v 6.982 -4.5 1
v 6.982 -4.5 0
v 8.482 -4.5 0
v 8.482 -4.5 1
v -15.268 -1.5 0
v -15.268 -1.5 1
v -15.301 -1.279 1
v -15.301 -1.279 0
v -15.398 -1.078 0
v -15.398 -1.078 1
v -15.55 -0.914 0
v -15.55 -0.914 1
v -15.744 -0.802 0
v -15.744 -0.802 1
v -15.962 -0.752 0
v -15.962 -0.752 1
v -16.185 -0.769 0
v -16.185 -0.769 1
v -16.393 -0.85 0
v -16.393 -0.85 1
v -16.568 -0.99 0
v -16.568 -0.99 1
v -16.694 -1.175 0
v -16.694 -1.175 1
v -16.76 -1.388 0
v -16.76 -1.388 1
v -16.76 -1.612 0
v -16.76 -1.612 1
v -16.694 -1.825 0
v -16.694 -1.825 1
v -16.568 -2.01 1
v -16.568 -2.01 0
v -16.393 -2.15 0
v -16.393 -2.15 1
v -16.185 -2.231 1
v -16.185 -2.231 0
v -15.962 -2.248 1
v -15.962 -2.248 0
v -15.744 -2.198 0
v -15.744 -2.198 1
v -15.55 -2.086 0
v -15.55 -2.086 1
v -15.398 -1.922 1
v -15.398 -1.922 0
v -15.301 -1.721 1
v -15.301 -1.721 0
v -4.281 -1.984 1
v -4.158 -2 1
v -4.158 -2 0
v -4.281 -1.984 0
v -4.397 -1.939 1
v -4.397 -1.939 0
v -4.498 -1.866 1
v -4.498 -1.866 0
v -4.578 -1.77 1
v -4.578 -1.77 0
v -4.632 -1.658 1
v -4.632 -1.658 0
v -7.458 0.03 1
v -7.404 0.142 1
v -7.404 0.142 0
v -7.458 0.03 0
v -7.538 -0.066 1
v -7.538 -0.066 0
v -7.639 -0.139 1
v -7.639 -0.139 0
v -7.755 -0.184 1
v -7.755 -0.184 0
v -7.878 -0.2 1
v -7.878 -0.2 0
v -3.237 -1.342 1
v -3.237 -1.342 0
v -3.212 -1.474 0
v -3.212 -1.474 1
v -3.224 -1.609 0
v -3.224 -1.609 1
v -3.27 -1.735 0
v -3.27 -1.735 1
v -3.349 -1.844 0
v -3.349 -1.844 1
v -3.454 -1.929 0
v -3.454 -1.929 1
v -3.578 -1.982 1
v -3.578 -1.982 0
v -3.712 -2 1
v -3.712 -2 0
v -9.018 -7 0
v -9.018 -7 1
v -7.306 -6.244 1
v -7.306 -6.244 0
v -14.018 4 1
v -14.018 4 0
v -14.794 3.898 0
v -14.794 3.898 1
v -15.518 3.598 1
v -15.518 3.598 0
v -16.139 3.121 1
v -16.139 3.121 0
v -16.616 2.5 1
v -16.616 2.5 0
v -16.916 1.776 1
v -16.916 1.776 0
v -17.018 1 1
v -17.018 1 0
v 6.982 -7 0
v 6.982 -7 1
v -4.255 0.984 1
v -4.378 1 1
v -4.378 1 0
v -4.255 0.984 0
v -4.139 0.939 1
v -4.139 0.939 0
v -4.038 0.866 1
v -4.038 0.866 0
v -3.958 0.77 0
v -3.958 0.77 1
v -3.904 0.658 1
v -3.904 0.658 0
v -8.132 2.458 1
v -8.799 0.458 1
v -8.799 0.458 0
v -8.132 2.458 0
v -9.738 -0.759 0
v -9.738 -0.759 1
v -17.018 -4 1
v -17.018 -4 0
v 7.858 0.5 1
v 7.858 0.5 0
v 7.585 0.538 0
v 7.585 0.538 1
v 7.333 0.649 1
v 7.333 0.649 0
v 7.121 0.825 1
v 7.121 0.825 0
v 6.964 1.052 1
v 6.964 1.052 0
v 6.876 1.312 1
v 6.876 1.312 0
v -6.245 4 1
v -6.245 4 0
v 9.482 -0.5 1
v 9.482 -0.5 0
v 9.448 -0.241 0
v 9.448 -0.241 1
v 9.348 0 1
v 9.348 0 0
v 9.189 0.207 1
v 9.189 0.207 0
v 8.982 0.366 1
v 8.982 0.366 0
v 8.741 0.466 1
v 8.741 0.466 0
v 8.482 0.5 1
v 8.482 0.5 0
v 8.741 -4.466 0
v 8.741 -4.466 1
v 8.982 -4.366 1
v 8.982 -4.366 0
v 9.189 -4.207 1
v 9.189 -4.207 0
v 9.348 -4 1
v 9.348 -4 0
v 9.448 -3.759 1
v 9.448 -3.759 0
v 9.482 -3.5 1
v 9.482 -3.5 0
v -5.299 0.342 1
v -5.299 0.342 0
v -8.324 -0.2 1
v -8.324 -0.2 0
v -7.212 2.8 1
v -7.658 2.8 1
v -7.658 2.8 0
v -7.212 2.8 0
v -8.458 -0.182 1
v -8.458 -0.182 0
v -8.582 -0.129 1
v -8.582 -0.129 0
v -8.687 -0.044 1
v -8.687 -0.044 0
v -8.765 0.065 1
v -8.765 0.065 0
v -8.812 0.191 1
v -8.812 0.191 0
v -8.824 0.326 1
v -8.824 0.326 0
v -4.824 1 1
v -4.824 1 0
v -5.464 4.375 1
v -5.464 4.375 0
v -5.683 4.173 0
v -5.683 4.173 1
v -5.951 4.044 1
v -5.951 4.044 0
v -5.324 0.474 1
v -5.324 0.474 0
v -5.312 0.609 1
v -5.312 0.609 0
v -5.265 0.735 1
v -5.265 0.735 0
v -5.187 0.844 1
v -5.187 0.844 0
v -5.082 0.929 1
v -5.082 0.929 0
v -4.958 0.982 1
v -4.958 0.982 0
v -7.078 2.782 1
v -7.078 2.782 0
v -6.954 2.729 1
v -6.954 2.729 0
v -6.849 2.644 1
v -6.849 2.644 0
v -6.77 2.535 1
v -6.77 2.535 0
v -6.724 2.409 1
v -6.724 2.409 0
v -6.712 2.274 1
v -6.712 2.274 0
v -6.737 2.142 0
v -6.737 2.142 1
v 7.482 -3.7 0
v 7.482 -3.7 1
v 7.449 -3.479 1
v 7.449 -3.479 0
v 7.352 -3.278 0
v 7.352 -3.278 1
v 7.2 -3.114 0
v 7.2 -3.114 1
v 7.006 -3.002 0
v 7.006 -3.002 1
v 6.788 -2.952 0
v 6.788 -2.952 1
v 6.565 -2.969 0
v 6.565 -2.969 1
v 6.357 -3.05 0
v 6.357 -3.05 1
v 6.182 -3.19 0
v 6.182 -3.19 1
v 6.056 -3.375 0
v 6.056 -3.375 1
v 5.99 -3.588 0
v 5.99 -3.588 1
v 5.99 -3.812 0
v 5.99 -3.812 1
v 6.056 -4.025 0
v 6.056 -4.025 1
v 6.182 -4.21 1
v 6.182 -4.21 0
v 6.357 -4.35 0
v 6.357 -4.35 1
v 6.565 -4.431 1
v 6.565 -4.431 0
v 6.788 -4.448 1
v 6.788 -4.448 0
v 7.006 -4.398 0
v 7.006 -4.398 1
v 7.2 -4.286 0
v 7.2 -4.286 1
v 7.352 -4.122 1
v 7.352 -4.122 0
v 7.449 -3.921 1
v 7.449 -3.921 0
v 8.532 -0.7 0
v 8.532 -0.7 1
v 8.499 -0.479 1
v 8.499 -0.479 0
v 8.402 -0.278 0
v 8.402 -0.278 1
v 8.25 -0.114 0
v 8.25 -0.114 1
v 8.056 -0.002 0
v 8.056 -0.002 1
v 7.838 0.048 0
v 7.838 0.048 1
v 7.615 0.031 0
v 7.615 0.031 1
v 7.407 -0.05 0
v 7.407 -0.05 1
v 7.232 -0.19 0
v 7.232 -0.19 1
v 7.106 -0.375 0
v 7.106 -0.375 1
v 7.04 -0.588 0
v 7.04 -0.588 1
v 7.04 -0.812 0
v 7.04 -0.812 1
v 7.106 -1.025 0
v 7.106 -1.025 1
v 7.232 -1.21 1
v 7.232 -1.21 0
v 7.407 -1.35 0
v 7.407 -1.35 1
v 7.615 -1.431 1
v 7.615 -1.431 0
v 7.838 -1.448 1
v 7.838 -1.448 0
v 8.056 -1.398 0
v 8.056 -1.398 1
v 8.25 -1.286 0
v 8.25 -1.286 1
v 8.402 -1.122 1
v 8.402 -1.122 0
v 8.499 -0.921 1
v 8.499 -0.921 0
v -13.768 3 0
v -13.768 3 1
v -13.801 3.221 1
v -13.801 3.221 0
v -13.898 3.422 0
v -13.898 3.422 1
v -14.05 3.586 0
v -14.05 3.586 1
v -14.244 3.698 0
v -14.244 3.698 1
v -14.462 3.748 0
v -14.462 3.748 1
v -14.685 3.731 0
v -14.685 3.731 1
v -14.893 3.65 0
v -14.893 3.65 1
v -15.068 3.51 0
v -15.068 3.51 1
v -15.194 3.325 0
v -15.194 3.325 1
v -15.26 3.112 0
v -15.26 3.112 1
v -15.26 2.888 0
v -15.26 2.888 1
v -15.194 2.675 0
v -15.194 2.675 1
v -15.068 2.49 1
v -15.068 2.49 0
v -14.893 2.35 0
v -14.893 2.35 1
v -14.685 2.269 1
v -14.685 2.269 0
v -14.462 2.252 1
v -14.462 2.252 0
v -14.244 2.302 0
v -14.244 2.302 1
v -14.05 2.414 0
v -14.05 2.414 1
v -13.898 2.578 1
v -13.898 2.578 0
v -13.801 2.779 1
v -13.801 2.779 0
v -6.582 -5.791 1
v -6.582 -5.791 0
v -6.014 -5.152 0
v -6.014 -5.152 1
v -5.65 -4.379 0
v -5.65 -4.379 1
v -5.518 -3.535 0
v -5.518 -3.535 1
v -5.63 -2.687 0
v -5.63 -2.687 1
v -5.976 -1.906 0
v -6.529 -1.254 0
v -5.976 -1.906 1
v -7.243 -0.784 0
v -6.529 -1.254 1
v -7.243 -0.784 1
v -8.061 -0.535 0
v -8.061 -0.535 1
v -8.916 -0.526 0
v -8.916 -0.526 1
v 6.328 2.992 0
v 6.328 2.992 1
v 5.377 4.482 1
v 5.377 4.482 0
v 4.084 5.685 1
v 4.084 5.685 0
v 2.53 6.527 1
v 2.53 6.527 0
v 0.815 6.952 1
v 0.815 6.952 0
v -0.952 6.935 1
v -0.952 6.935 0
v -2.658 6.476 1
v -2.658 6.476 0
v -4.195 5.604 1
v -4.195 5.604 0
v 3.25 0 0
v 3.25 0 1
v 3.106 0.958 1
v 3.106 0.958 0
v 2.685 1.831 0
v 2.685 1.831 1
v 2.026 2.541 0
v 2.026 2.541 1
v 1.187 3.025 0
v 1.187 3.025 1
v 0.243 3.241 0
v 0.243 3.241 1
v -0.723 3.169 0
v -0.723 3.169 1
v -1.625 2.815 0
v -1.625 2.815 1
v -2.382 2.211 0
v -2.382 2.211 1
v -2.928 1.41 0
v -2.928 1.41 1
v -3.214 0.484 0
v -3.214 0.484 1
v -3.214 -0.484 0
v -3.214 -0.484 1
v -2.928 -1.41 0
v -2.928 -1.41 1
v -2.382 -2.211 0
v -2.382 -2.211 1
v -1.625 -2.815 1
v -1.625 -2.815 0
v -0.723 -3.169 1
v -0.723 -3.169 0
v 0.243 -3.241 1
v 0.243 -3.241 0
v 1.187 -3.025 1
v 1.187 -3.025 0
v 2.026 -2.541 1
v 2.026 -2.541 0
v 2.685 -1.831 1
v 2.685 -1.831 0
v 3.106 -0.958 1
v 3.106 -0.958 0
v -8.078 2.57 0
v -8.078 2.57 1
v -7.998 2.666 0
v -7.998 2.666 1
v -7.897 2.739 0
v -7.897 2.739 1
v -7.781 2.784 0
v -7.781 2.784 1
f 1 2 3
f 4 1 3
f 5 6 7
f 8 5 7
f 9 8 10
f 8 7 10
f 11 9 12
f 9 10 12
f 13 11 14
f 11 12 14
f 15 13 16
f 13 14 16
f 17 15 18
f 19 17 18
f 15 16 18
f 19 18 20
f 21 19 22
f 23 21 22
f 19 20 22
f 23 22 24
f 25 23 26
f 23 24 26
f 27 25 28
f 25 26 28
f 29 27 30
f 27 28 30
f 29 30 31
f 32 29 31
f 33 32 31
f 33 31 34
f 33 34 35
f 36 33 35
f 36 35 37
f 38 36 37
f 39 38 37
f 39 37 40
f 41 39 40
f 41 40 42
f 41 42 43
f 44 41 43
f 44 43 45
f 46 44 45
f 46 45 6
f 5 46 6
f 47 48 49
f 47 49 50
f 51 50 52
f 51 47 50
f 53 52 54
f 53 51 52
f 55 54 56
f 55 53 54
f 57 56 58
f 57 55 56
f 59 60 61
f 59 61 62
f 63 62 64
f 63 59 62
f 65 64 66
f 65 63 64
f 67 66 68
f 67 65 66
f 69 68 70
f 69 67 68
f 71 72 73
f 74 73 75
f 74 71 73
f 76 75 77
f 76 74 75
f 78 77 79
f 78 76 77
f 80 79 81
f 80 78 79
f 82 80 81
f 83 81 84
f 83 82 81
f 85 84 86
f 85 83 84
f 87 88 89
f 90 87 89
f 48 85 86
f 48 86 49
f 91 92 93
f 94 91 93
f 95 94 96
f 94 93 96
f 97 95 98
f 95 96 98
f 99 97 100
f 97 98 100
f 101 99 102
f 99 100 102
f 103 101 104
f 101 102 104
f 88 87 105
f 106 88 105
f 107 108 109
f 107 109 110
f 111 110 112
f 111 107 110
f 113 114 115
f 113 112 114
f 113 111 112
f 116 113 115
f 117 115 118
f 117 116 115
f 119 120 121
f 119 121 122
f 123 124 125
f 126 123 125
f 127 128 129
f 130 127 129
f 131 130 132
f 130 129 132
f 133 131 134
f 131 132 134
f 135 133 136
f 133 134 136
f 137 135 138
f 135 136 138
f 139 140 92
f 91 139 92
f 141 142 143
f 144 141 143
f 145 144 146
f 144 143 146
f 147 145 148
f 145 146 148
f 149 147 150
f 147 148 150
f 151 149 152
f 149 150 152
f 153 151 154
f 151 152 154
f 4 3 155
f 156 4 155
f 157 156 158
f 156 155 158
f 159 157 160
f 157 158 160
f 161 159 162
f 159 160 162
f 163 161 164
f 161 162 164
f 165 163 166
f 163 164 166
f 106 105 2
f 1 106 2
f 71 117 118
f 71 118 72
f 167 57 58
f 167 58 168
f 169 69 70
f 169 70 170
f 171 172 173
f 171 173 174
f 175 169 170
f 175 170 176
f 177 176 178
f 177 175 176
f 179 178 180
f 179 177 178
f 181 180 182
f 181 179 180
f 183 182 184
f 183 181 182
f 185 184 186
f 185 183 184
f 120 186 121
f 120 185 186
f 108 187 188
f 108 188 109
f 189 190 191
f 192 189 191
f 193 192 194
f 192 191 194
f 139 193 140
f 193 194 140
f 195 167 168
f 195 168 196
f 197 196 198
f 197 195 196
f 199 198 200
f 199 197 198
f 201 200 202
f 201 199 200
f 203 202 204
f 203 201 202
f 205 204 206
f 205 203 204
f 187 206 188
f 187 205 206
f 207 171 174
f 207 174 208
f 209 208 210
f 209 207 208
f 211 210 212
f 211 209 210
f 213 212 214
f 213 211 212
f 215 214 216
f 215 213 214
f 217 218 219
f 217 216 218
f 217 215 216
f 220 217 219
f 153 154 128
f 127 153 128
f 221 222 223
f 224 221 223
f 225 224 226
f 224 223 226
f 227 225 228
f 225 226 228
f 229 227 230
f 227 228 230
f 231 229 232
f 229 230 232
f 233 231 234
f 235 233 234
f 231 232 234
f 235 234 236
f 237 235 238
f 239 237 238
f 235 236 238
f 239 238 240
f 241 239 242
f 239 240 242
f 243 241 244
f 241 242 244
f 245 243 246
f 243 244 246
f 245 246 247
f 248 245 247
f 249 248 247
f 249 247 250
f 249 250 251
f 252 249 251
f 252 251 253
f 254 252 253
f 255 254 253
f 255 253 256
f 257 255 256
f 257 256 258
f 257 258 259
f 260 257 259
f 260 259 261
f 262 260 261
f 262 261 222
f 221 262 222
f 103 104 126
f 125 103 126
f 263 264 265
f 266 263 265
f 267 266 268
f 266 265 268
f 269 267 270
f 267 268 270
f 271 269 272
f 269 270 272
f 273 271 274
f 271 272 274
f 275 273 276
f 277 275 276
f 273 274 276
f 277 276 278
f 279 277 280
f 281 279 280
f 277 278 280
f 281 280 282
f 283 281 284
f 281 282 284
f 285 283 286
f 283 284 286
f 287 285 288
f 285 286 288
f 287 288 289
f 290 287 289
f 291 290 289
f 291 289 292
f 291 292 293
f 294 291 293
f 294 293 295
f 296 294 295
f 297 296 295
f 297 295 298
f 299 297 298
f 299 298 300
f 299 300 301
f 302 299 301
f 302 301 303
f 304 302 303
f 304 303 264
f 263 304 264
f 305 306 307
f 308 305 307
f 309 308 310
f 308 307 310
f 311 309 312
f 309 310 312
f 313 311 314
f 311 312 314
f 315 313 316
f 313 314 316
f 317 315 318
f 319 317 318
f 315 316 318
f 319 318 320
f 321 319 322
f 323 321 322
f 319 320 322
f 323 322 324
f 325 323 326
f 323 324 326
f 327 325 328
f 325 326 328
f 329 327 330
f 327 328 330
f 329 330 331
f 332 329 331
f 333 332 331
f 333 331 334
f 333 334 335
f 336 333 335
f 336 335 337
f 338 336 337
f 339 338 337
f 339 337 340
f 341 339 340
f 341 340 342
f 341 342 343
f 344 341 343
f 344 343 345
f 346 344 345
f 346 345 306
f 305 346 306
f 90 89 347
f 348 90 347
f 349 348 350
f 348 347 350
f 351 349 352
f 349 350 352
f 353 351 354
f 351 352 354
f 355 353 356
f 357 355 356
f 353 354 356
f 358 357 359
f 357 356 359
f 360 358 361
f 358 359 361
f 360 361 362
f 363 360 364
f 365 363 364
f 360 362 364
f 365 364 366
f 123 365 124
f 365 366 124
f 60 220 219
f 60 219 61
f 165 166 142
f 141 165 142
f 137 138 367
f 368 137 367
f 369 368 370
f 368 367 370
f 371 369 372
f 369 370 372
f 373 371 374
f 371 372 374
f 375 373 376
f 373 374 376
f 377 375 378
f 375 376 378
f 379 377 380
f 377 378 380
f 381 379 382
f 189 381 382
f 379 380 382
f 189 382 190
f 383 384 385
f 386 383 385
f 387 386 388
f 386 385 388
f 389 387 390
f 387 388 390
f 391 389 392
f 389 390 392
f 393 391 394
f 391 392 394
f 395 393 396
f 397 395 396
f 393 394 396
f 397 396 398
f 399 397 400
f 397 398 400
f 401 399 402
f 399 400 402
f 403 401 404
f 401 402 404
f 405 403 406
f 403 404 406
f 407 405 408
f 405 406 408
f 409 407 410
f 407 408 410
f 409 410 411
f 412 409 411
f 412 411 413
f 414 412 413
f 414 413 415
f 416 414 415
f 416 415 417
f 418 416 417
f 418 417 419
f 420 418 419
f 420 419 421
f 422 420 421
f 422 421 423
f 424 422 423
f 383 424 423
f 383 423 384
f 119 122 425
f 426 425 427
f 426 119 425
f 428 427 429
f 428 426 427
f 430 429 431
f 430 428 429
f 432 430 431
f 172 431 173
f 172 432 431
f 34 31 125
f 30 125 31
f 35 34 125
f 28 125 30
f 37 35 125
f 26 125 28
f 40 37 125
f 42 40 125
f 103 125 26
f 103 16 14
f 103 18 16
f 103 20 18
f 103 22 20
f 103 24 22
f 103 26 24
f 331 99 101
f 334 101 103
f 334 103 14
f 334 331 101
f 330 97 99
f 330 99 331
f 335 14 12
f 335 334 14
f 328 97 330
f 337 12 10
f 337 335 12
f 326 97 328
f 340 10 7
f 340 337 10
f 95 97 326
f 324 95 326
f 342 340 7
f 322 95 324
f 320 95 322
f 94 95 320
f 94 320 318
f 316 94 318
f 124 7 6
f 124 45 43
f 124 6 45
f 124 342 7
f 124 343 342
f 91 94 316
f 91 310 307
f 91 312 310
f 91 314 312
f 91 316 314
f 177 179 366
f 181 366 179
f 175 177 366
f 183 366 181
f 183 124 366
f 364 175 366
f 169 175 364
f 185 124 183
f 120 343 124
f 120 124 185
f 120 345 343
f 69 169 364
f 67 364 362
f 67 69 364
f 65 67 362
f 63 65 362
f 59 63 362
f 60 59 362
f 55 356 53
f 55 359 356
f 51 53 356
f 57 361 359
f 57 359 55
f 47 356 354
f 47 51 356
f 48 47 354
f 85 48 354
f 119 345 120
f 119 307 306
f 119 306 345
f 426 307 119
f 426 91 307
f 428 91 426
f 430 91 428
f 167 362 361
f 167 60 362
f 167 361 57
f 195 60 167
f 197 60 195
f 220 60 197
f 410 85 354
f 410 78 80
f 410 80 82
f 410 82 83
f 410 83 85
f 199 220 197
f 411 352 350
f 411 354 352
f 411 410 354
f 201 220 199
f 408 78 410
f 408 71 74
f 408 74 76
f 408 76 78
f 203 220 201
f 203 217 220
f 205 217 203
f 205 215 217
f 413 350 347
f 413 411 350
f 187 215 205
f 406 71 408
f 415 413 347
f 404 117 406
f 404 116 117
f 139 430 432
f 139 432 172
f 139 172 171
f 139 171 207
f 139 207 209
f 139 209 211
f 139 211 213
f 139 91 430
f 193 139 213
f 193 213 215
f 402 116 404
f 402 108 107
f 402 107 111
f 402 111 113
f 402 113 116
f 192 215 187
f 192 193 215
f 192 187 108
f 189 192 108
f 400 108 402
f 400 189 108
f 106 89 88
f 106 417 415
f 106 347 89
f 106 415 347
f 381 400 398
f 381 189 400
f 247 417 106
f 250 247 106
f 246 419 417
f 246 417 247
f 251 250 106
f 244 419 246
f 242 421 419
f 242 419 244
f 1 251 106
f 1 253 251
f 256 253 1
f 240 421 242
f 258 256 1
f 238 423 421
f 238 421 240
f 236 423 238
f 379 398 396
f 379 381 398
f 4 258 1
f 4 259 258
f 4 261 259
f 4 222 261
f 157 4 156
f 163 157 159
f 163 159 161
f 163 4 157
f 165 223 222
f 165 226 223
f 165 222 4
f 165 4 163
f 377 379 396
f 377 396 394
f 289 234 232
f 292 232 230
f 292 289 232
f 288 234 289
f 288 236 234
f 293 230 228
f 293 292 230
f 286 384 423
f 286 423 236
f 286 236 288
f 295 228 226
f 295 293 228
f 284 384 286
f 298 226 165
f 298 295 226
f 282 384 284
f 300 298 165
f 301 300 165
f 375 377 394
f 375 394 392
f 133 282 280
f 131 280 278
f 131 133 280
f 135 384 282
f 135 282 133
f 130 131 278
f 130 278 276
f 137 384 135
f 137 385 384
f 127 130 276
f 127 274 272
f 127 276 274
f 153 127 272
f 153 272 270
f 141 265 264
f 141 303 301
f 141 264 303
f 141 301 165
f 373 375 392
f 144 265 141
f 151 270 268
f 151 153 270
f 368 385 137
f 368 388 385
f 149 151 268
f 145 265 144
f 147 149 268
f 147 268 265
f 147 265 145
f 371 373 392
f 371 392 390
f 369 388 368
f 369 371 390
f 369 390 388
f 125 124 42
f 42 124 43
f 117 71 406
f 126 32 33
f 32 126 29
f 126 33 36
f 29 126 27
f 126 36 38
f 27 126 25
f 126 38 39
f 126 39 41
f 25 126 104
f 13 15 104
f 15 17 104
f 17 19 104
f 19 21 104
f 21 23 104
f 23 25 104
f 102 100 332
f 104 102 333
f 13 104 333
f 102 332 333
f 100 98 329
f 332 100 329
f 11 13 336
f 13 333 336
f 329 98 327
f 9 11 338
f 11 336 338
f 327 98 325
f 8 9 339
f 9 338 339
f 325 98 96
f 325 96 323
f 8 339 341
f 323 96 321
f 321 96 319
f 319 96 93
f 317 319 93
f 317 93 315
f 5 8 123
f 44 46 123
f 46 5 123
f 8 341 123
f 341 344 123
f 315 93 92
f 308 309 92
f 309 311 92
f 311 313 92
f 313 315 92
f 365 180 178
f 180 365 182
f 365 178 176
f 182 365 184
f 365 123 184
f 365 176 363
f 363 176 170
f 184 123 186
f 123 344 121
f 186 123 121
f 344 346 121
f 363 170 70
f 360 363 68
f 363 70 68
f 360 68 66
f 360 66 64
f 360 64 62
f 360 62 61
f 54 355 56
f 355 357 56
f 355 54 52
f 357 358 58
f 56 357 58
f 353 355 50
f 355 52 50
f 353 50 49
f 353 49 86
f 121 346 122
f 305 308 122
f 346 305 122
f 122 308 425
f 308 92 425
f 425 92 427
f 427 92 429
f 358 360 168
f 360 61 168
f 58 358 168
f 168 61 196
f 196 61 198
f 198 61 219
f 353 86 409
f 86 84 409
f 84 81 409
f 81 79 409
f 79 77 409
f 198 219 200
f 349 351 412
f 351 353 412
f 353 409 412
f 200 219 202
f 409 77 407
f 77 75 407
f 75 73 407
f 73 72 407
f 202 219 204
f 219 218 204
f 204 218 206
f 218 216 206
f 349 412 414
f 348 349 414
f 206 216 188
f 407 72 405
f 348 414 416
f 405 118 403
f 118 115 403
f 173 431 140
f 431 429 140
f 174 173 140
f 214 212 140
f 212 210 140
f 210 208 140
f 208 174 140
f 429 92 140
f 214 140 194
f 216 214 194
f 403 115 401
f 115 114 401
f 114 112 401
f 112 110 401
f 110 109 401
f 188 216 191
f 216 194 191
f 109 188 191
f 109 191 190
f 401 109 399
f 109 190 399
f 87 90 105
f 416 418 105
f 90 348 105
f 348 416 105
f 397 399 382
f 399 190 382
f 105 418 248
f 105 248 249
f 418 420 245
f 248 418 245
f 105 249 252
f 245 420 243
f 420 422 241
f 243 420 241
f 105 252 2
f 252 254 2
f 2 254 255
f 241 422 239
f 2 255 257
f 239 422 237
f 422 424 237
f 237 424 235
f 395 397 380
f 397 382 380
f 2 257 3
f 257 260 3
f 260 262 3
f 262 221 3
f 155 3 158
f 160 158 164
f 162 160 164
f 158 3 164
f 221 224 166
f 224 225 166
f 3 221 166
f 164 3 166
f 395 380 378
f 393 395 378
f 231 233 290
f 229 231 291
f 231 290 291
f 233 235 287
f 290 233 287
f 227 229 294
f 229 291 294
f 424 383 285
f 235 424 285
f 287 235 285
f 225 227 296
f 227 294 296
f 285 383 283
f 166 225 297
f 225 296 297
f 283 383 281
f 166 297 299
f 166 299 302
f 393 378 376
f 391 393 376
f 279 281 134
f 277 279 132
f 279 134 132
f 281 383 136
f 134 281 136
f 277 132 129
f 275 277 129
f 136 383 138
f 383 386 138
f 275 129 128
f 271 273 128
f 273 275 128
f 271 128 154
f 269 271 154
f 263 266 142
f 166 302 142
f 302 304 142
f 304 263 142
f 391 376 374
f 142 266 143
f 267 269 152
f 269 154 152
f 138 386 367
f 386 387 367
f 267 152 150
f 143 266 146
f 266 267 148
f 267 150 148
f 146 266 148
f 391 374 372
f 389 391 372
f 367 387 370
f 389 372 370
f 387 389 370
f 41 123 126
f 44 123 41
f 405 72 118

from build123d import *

# Parameters (mm, degrees)
BOSS_EXTRUDE1_DEPTH = 1
SKETCH3_R           = 3.25
CUT_EXTRUDE2_DEPTH  = 10
SKETCH4_R           = 0.75
CUT_EXTRUDE3_DEPTH  = 10


with BuildPart() as part:
    # Sketch1 → Boss-Extrude1 (new body)
    with BuildSketch(Plane.XY):
        with BuildLine():
            Line((-17.017879978, -7), (6.982120022, -7))
            Line((6.982120022, -7), (6.982120022, -5.5))
            Line((6.982120022, -5.5), (6.982120022, -4.5))
            Line((6.982120022, -4.5), (7.982120022, -4.5))
            Line((7.982120022, -4.5), (8.482120022, -4.5))
            ThreePointArc((8.482120022, -4.5), (9.189226803, -4.207106781), (9.482120022, -3.5))
            Line((9.482120022, -3.5), (9.482120022, -0.5))
            ThreePointArc((9.482120022, -0.5), (9.189226803, 0.207106781), (8.482120022, 0.5))
            Line((8.482120022, 0.5), (7.858116823, 0.5))
            ThreePointArc((7.858116823, 0.5), (7.220739384, 0.72944825), (6.87585222, 1.3125))
            ThreePointArc((6.87585222, 1.3125), (1.68605895, 6.793909421), (-5.464373249, 4.375))
            ThreePointArc((-5.464373249, 4.375), (-5.811985297, 4.098612181), (-6.244997998, 4))
            Line((-6.244997998, 4), (-14.017879978, 4))
            ThreePointArc((-14.017879978, 4), (-16.139200322, 3.121320344), (-17.017879978, 1))
            Line((-17.017879978, 1), (-17.017879978, -7))
        make_face()
    extrude(amount=BOSS_EXTRUDE1_DEPTH)

    # Sketch3 → Cut-Extrude2 (cut)
    with BuildSketch(Plane.XY.offset(1)):
        with BuildLine():
            Line((-9.737921814, -0.759288793), (-17.017879978, -4))
            Line((-17.017879978, -4), (-17.017879978, -7))
            Line((-17.017879978, -7), (-9.017879978, -7))
            Line((-9.017879978, -7), (-7.306383876, -6.244499443))
            ThreePointArc((-7.306383876, -6.244499443), (-5.775271325, -2.284229555), (-9.737921814, -0.759288793))
        make_face()
        with BuildLine():
            ThreePointArc((-8.131842017, 2.458113883), (-7.94985551, 2.705621093), (-7.657500368, 2.8))
            Line((-7.657500368, 2.8), (-7.211592921, 2.8))
            ThreePointArc((-7.211592921, 2.8), (-6.805971829, 2.592355142), (-6.737251272, 2.141886117))
            Line((-6.737251272, 2.141886117), (-7.403917939, 0.141886117))
            ThreePointArc((-7.403917939, 0.141886117), (-7.585904446, -0.105621093), (-7.878259588, -0.2))
            Line((-7.878259588, -0.2), (-8.324167035, -0.2))
            ThreePointArc((-8.324167035, -0.2), (-8.729788127, 0.007644858), (-8.798508684, 0.458113883))
            Line((-8.798508684, 0.458113883), (-8.131842017, 2.458113883))
        make_face()
        with BuildLine():
            ThreePointArc((-5.298508684, 0.341886117), (-5.229788127, 0.792355142), (-4.824167035, 1))
            Line((-4.824167035, 1), (-4.378259588, 1))
            ThreePointArc((-4.378259588, 1), (-4.085904446, 0.905621093), (-3.903917939, 0.658113883))
            Line((-3.903917939, 0.658113883), (-3.237251272, -1.341886117))
            ThreePointArc((-3.237251272, -1.341886117), (-3.305971829, -1.792355142), (-3.711592921, -2))
            Line((-3.711592921, -2), (-4.157500368, -2))
            ThreePointArc((-4.157500368, -2), (-4.44985551, -1.905621093), (-4.631842017, -1.658113883))
            Line((-4.631842017, -1.658113883), (-5.298508684, 0.341886117))
        make_face()
        Circle(SKETCH3_R)
    extrude(amount=-CUT_EXTRUDE2_DEPTH, mode=Mode.SUBTRACT)

    # Sketch4 → Cut-Extrude3 (cut)
    with BuildSketch(Plane.XY.offset(1)):
        with Locations((-14.517879978, 3)):
            Circle(SKETCH4_R)
        with Locations((-16.017879978, -1.5)):
            Circle(SKETCH4_R)
        with Locations((7.782120022, -0.7)):
            Circle(SKETCH4_R)
        with Locations((6.732120022, -3.7)):
            Circle(SKETCH4_R)
    extrude(amount=-CUT_EXTRUDE3_DEPTH, mode=Mode.SUBTRACT)


solid = part.part
